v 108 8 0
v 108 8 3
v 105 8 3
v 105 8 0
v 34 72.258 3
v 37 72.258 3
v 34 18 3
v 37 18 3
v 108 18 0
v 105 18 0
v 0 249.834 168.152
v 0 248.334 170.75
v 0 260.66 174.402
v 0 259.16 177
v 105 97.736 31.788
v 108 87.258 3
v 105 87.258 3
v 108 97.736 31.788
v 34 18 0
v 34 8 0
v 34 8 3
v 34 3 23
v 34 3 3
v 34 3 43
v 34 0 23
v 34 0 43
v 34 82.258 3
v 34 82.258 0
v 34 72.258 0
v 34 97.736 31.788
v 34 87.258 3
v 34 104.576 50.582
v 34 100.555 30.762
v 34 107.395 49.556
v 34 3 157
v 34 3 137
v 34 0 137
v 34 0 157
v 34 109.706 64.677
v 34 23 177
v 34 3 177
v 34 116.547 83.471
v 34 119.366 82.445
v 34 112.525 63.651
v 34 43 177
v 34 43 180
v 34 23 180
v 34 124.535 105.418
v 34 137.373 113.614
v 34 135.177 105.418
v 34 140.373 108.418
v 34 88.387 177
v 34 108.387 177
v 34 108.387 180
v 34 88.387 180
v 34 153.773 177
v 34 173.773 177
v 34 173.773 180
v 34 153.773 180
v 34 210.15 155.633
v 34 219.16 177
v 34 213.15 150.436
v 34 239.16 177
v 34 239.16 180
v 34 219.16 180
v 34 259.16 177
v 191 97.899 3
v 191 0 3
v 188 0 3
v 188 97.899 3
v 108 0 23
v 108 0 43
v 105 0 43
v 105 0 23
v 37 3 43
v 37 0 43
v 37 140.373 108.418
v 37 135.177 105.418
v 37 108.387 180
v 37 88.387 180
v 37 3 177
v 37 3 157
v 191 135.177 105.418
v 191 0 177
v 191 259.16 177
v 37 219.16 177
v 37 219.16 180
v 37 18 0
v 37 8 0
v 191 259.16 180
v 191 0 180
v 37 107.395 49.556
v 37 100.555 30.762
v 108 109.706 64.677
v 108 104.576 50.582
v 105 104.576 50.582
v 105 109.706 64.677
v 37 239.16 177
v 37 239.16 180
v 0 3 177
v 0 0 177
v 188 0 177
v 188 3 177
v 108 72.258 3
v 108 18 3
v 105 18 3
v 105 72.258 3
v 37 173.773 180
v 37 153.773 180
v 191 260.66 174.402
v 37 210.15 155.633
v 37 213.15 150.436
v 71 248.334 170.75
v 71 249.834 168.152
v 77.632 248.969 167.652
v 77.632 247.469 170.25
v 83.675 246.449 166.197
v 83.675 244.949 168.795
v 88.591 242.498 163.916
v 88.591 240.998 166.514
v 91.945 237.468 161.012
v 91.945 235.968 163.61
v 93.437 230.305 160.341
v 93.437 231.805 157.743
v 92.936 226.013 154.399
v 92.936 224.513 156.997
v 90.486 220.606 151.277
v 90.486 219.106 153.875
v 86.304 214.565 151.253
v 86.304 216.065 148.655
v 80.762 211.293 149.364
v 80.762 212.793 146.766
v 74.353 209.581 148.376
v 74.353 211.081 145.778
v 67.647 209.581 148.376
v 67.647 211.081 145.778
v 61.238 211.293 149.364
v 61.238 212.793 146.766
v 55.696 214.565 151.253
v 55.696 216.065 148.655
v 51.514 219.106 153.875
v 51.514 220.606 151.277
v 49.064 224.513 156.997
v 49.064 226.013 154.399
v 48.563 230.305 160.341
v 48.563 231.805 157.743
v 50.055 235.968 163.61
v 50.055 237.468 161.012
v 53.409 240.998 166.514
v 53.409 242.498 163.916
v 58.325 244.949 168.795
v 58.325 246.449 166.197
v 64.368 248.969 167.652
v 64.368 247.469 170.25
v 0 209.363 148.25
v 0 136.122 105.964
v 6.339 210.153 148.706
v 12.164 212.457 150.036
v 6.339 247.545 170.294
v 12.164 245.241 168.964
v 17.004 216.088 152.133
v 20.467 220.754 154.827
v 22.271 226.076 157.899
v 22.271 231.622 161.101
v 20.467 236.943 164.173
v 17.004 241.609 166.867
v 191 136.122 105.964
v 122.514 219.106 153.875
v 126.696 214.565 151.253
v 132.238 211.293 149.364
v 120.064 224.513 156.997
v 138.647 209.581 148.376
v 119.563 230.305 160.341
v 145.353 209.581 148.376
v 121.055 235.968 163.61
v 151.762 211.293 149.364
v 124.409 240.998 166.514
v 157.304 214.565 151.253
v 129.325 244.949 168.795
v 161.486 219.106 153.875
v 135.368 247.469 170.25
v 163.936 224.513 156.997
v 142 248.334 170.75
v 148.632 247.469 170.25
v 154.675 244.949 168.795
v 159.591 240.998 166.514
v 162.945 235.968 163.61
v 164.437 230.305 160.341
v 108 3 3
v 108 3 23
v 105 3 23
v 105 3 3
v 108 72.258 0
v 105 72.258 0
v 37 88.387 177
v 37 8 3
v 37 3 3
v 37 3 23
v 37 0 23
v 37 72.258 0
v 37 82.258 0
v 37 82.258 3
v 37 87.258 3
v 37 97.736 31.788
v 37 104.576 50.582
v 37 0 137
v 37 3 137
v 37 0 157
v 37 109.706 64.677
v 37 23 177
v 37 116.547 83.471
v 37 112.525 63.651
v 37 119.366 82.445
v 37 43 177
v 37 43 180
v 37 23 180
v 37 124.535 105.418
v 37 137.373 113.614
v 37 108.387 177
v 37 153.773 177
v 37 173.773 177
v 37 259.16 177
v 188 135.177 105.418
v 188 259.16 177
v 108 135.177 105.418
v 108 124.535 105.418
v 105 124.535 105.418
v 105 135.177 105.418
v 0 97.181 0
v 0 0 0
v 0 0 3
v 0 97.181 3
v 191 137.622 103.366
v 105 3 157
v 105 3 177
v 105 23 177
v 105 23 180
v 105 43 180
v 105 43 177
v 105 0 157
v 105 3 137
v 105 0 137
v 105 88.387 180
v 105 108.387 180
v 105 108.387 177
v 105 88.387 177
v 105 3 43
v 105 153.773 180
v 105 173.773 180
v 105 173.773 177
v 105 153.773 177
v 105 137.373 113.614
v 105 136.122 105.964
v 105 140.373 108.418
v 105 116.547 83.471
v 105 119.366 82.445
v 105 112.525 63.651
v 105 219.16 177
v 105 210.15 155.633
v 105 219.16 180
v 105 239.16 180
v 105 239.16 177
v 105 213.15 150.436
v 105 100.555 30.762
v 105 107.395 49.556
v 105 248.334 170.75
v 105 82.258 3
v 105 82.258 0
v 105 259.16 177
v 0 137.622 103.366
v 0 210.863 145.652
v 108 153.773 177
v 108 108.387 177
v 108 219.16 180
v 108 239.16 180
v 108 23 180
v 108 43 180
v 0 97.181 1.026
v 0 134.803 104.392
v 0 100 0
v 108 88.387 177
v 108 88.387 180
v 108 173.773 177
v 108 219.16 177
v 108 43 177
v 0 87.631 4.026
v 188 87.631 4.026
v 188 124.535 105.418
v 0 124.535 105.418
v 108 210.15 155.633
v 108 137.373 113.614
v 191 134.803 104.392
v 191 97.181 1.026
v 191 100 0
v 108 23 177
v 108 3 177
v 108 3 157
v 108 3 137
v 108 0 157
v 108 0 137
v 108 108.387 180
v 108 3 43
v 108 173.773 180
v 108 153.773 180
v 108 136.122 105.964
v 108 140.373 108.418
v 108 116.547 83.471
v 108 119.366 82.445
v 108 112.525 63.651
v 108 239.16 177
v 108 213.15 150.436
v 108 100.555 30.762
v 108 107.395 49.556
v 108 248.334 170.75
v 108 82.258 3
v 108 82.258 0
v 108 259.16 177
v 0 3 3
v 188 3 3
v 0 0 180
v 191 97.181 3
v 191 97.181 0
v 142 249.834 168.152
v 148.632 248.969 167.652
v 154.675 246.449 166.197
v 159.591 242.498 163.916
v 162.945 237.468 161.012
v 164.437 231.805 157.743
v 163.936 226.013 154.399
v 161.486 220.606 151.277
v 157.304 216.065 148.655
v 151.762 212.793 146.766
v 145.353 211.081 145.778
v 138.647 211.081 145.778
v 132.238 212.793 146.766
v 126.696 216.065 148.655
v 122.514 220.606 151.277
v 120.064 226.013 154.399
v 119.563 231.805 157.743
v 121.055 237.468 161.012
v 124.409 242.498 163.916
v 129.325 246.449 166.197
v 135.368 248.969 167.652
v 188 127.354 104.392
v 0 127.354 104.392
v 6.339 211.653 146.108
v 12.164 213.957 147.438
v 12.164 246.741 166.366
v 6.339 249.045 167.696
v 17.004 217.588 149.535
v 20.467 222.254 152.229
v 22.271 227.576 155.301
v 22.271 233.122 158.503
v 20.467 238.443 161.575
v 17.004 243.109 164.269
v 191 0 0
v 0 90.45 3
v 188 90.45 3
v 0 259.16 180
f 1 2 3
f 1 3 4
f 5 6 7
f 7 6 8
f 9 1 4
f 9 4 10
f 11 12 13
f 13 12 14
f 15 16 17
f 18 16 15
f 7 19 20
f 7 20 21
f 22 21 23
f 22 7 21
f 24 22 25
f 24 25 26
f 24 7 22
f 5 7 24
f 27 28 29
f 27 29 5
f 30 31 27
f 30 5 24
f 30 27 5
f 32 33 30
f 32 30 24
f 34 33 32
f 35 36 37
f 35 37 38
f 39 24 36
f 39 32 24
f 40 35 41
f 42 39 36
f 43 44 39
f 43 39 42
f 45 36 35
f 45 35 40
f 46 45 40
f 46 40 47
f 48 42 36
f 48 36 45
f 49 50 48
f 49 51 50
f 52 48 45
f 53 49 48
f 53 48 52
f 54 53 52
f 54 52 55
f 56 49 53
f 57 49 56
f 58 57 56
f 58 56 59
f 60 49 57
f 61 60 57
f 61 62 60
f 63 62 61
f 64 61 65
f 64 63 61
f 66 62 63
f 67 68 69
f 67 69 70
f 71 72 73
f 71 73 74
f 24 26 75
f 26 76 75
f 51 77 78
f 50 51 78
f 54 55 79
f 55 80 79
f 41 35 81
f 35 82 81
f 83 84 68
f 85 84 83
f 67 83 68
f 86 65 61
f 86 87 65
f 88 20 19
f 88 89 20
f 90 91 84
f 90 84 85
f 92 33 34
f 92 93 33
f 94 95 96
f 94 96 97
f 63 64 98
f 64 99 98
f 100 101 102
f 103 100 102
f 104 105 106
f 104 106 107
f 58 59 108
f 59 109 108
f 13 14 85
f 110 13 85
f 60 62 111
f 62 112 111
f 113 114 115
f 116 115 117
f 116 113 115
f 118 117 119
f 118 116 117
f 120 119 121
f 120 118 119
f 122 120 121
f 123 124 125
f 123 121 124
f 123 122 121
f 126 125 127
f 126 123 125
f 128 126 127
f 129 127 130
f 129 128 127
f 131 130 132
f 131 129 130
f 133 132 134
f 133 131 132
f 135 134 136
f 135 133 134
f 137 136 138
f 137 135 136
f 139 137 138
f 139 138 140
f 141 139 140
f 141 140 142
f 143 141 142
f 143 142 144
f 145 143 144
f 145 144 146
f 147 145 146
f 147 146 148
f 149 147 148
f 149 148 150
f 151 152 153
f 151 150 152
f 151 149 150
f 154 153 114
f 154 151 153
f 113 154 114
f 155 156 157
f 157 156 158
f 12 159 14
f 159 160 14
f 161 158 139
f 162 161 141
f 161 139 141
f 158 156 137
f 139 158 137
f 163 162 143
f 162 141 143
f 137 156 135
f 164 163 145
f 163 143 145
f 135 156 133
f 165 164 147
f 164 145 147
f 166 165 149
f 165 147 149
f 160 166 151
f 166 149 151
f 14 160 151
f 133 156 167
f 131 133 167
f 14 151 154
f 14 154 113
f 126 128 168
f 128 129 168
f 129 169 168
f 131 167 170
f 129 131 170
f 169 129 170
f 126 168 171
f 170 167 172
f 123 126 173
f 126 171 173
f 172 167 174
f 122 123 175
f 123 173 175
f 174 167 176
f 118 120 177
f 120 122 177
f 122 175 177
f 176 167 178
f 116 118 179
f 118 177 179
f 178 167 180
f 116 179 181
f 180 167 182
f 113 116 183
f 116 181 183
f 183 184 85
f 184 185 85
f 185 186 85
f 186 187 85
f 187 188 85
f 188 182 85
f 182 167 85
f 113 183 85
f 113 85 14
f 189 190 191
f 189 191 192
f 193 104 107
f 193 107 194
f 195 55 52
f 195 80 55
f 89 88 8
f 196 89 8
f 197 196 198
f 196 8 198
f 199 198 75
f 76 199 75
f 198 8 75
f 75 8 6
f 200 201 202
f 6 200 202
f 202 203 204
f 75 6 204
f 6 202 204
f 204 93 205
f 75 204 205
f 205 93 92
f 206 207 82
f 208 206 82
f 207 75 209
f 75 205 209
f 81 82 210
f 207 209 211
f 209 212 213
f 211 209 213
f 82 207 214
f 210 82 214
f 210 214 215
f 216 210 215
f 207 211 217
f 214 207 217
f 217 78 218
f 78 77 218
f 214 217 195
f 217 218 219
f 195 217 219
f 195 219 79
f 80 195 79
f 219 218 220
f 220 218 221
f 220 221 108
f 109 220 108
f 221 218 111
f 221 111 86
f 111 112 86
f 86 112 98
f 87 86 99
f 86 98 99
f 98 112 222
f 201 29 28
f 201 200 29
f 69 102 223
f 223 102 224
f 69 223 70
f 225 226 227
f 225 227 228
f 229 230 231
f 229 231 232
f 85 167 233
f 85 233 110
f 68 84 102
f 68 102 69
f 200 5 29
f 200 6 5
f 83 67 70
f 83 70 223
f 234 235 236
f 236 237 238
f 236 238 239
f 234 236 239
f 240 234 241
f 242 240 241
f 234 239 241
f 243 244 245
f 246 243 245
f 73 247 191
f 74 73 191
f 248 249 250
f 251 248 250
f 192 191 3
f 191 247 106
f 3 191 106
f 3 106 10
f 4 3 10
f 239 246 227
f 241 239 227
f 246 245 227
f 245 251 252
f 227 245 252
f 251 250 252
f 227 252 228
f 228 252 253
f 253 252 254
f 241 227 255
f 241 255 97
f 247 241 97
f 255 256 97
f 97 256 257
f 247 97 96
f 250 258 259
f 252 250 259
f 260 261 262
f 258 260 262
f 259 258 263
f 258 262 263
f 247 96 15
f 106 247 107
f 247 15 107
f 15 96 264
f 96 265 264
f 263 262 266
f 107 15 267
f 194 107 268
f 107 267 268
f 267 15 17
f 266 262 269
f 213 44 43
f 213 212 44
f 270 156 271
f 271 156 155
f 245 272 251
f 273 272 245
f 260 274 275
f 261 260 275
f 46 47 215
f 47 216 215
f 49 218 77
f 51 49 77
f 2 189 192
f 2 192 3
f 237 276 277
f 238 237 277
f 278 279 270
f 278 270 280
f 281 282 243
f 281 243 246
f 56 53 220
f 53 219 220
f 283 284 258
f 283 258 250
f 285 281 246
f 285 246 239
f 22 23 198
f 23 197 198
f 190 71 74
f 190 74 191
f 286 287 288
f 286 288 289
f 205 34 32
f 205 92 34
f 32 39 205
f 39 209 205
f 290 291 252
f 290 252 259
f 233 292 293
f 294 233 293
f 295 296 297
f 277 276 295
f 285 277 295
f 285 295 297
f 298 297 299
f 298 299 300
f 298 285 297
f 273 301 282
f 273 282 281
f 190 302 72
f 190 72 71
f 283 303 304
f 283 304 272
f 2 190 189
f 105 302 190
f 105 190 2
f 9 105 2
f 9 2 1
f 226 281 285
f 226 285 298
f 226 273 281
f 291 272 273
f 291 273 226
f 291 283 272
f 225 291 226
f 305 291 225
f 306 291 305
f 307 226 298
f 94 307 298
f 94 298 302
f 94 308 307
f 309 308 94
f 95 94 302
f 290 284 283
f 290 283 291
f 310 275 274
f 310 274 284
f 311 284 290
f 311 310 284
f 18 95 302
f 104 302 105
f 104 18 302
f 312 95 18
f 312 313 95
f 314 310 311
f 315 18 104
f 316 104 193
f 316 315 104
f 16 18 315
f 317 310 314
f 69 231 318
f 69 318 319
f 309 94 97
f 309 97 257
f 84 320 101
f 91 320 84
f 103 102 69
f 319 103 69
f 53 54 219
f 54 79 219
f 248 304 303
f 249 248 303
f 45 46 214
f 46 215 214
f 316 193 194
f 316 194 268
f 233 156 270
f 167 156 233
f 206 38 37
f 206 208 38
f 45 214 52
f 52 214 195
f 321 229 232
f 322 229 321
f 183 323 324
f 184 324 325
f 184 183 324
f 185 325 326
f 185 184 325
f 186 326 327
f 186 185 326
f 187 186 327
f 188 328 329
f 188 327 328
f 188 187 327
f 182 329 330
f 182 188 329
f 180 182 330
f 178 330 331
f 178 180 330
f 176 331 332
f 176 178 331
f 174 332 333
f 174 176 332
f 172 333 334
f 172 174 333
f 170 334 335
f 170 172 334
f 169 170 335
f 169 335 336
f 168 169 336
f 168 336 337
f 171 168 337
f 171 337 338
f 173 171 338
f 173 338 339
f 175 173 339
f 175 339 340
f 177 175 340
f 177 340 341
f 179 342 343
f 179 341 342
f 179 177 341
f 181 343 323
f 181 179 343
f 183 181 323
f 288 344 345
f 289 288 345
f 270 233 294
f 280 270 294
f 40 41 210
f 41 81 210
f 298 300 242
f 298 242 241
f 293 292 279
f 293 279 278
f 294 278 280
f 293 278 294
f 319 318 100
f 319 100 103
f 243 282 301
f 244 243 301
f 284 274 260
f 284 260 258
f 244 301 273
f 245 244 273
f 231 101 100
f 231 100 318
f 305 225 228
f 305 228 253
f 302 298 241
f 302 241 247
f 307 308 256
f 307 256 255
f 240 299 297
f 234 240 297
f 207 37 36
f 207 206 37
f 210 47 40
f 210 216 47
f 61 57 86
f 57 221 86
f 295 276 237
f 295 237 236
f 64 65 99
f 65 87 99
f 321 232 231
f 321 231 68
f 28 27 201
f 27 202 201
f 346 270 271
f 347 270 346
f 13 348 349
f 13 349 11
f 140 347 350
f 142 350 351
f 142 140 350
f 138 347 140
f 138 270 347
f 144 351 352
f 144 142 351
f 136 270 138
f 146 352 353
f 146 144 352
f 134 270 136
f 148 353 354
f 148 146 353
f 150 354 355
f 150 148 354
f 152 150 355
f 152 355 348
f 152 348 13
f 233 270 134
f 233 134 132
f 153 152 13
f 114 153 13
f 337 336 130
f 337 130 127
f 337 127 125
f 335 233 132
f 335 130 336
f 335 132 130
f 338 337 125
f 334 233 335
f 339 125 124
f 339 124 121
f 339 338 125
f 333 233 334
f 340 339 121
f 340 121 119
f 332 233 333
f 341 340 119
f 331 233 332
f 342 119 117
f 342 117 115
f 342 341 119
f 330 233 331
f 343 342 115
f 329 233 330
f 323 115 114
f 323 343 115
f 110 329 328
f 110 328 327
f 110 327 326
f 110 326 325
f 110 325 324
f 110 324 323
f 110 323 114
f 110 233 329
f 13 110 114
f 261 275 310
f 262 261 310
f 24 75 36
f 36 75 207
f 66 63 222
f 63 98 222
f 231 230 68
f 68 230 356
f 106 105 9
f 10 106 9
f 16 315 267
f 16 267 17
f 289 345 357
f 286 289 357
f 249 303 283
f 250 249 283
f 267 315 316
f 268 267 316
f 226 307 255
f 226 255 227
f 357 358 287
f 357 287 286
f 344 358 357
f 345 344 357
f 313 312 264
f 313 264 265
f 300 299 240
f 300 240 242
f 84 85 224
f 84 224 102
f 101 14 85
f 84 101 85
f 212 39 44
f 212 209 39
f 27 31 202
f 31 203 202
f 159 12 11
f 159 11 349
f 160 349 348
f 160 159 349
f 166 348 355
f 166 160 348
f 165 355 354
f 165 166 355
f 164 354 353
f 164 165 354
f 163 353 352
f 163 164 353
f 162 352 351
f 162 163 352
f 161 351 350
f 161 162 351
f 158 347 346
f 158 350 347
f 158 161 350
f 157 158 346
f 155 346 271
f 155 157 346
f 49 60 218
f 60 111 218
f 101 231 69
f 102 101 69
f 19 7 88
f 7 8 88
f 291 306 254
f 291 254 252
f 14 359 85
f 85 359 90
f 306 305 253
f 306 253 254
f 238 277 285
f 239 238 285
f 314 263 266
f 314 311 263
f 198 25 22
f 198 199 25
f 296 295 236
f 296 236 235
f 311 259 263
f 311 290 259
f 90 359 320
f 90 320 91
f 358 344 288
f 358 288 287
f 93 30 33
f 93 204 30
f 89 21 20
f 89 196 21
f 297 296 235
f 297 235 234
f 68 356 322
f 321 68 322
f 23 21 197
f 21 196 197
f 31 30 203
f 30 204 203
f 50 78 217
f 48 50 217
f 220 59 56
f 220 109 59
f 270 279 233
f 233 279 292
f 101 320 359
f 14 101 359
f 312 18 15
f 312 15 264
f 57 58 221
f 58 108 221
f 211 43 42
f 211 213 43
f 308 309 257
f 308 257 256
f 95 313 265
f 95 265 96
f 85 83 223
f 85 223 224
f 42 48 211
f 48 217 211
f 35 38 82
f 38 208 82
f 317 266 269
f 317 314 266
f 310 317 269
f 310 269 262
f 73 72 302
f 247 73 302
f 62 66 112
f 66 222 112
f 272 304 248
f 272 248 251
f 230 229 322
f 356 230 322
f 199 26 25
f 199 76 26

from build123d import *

# Parameters (mm, degrees)
ESQUISSE3_W                = 188
ESQUISSE3_H                = 174
PLQ_BASE_DEPTH             = 3
ESQUISSE4_W                = 191
ESQUISSE4_H                = 259.159718809
PLQ_ARRIERE_DEPTH          = 3
ESQUISSE5_W                = 191
ESQUISSE5_H                = 97.180922138
PLQ_AVANT_DEPTH            = 3
ESQUISSE6_W                = 142.071471004
ESQUISSE6_H                = 191
PLQ_PANNEAU_DESSUS_DEPTH   = 3
ESQUISSE11_W               = 110
ESQUISSE11_H               = 191
PLQ_TABLETTE_DEPTH         = 3
PLQ_COTE_START             = 191
PLQ_COTE_DEPTH             = 3
ESQUISSE9_R                = 22.5
FENTE_1_DEPTH              = 370.018781398
R_P_TITION_LIN_AIRE2_COUNT = 3
R_P_TITION_LIN_AIRE2_PITCH = 71
SEPARATEUR_1_START         = 106.5
ESQUISSE10_W               = 3
ESQUISSE10_H               = 20
ESQUISSE10_W_2             = 20
ESQUISSE10_H_2             = 3
ESQUISSE10_H_3             = 10
SEPARATEUR_1_DEPTH         = 1.5
SEPARATEUR_2_START         = 35.5
ESQUISSE10_3_W             = 3
ESQUISSE10_3_H             = 10
ESQUISSE10_3_W_2           = 20
ESQUISSE10_3_H_2           = 3
ESQUISSE10_3_H_3           = 20
SEPARATEUR_2_DEPTH         = 1.5
ESQUISSE13_W               = 188
ESQUISSE13_H               = 107.899377386
PLQ_SUPPORT_TABLETTE_DEPTH = 3


with BuildPart() as part:
    # Esquisse3 → plq_base (new body)
    with BuildSketch(Plane(origin=(0, 0, 0), x_dir=(1, 0, 0), z_dir=(0, 1, 0))):
        with Locations((94, -90)):
            Rectangle(ESQUISSE3_W, ESQUISSE3_H)
    extrude(amount=PLQ_BASE_DEPTH)


with BuildPart() as body_2:
    # Esquisse4 → plq_arriere (new body)
    with BuildSketch(Plane.XY.offset(180)):
        with Locations((95.5, 129.579859405)):
            Rectangle(ESQUISSE4_W, ESQUISSE4_H)
    extrude(amount=-PLQ_ARRIERE_DEPTH)


with BuildPart() as body_3:
    # Esquisse5 → plq_avant (new body)
    with BuildSketch(Plane.XY):
        with Locations((95.5, 48.590461069)):
            Rectangle(ESQUISSE5_W, ESQUISSE5_H)
    extrude(amount=PLQ_AVANT_DEPTH)


with BuildPart() as body_4:
    # Esquisse6 → plq_panneau (dessus) (new body)
    with BuildSketch(Plane(origin=(0, -11.853318533, 20.530549937), x_dir=(0, 0.8660254037844439, 0.4999999999999909), z_dir=(0, 0.4999999999999909, -0.8660254037844439))):
        with Locations((241.903164624, 95.5)):
            Rectangle(ESQUISSE6_W, ESQUISSE6_H)
    extrude(amount=PLQ_PANNEAU_DESSUS_DEPTH)

    # Esquisse9 → fente_1 (cut, through all)
    with BuildSketch(Plane(origin=(0, -11.853318533, 20.530549937), x_dir=(0, 0.8660254037844439, 0.4999999999999909), z_dir=(0, 0.4999999999999909, -0.8660254037844439))):
        with Locations((277.938900126, 142)):
            Circle(ESQUISSE9_R)
    fente_1 = extrude(amount=FENTE_1_DEPTH, mode=Mode.SUBTRACT)

    # Répétition linéaire2: fente_1 ×3
    with Locations(*[(-i * R_P_TITION_LIN_AIRE2_PITCH, 0, 0) for i in range(1, R_P_TITION_LIN_AIRE2_COUNT)]):
        add(fente_1, mode=Mode.SUBTRACT)


with BuildPart() as body_5:
    # Esquisse11 → plq_tablette (new body)
    with BuildSketch(Plane(origin=(0, 85.483144294, -31.113320054), x_dir=(0, -0.3420201433256655, -0.9396926207859096), z_dir=(0, -0.9396926207859095, 0.34202014332566544))):
        with Locations((-89.202014333, 95.5)):
            Rectangle(ESQUISSE11_W, ESQUISSE11_H)
    extrude(amount=-PLQ_TABLETTE_DEPTH)


with BuildPart() as body_6:
    # Esquisse7 → plq_cote (new body)
    with BuildSketch(Plane(origin=(0, 0, 0), x_dir=(0, 0, -1), z_dir=(1, 0, 0)).offset(PLQ_COTE_START)):
        Polygon((-177, 259.159718809), (-177, 0), (-3, 0), (-3, 97.899377385), (-105.418309146, 135.176593359), align=None)
    extrude(amount=-PLQ_COTE_DEPTH)


with BuildPart() as body_7:
    # Esquisse10 → separateur_1 (new, symmetric)
    with BuildSketch(Plane(origin=(0, 0, 0), x_dir=(0, 0, -1), z_dir=(1, 0, 0)).offset(SEPARATEUR_1_START)):
        Polygon((-170.75, 248.334401261), (-177, 259.159718809), (-177, 239.159718809), (-177, 219.159718809), (-177, 173.773145872), (-177, 153.773145872), (-177, 108.386572936), (-177, 88.386572936), (-177, 43), (-177, 23), (-177, 3), (-157, 3), (-137, 3), (-43, 3), (-23, 3), (-3, 3), (-3, 8), (-3, 18), (-3, 72.257599661), (-3, 82.257599661), (-3, 87.257599661), (-31.787808935, 97.735505223), (-50.581661351, 104.575908089), (-64.677050662, 109.706210239), (-83.470903078, 116.546613106), (-105.418309146, 124.534815634), (-105.418309146, 135.176593359), (-105.964264498, 136.122215766), (-108.418309146, 140.372745781), (-113.614461569, 137.372745781), (-155.632535537, 210.15018473), (-150.436383114, 213.15018473), align=None)
        with Locations((-178.5, 229.159718809)):
            Rectangle(ESQUISSE10_W, ESQUISSE10_H)
        with Locations((-178.5, 33)):
            Rectangle(ESQUISSE10_W, ESQUISSE10_H)
        with Locations((-147, 1.5)):
            Rectangle(ESQUISSE10_W_2, ESQUISSE10_H_2)
        with Locations((-33, 1.5)):
            Rectangle(ESQUISSE10_W_2, ESQUISSE10_H_2)
        with Locations((-1.5, 13)):
            Rectangle(ESQUISSE10_W, ESQUISSE10_H_3)
        with Locations((-1.5, 77.257599661)):
            Rectangle(ESQUISSE10_W, ESQUISSE10_H_3)
        Polygon((-82.444842648, 119.365690968), (-83.470903078, 116.546613106), (-64.677050662, 109.706210239), (-63.650990232, 112.525288101), align=None)
        Polygon((-49.555600921, 107.394985952), (-50.581661351, 104.575908089), (-31.787808935, 97.735505223), (-30.761748505, 100.554583085), align=None)
        with Locations((-178.5, 163.773145872)):
            Rectangle(ESQUISSE10_W, ESQUISSE10_H)
        with Locations((-178.5, 98.386572936)):
            Rectangle(ESQUISSE10_W, ESQUISSE10_H)
    extrude(amount=SEPARATEUR_1_DEPTH, both=True)


with BuildPart() as body_8:
    # Esquisse10<3> → separateur_2 (new, symmetric)
    with BuildSketch(Plane(origin=(0, 0, 0), x_dir=(0, 0, -1), z_dir=(1, 0, 0)).offset(SEPARATEUR_2_START)):
        Polygon((-105.418309146, 135.176593359), (-105.418309146, 124.534815634), (-3, 87.257599661), (-3, 3), (-177, 3), (-177, 259.159718809), (-150.436383114, 213.15018473), (-155.632535537, 210.15018473), (-113.614461569, 137.372745781), (-108.418309146, 140.372745781), align=None)
        Polygon((-82.444842648, 119.365690968), (-83.470903078, 116.546613106), (-64.677050662, 109.706210239), (-63.650990232, 112.525288101), align=None)
        with Locations((-1.5, 77.257599661)):
            Rectangle(ESQUISSE10_3_W, ESQUISSE10_3_H)
        with Locations((-1.5, 13)):
            Rectangle(ESQUISSE10_3_W, ESQUISSE10_3_H)
        with Locations((-33, 1.5)):
            Rectangle(ESQUISSE10_3_W_2, ESQUISSE10_3_H_2)
        with Locations((-147, 1.5)):
            Rectangle(ESQUISSE10_3_W_2, ESQUISSE10_3_H_2)
        with Locations((-178.5, 33)):
            Rectangle(ESQUISSE10_3_W, ESQUISSE10_3_H_3)
        with Locations((-178.5, 98.386572936)):
            Rectangle(ESQUISSE10_3_W, ESQUISSE10_3_H_3)
        with Locations((-178.5, 163.773145872)):
            Rectangle(ESQUISSE10_3_W, ESQUISSE10_3_H_3)
        with Locations((-178.5, 229.159718809)):
            Rectangle(ESQUISSE10_3_W, ESQUISSE10_3_H_3)
        Polygon((-49.555600921, 107.394985952), (-50.581661351, 104.575908089), (-31.787808935, 97.735505223), (-30.761748505, 100.554583085), align=None)
    extrude(amount=SEPARATEUR_2_DEPTH, both=True)


with BuildPart() as body_9:
    # Esquisse13 → plq support tablette (new body)
    with BuildSketch(Plane(origin=(0, 78.905295948, -28.719179051), x_dir=(-1, 0, 0), z_dir=(0, -0.9396926207859095, 0.3420201433256655))):
        with Locations((-94, -87.704534)):
            Rectangle(ESQUISSE13_W, ESQUISSE13_H)
    extrude(amount=PLQ_SUPPORT_TABLETTE_DEPTH)


solid = Compound([part.part, body_2.part, body_3.part, body_4.part, body_5.part, body_6.part, body_7.part, body_8.part, body_9.part])
